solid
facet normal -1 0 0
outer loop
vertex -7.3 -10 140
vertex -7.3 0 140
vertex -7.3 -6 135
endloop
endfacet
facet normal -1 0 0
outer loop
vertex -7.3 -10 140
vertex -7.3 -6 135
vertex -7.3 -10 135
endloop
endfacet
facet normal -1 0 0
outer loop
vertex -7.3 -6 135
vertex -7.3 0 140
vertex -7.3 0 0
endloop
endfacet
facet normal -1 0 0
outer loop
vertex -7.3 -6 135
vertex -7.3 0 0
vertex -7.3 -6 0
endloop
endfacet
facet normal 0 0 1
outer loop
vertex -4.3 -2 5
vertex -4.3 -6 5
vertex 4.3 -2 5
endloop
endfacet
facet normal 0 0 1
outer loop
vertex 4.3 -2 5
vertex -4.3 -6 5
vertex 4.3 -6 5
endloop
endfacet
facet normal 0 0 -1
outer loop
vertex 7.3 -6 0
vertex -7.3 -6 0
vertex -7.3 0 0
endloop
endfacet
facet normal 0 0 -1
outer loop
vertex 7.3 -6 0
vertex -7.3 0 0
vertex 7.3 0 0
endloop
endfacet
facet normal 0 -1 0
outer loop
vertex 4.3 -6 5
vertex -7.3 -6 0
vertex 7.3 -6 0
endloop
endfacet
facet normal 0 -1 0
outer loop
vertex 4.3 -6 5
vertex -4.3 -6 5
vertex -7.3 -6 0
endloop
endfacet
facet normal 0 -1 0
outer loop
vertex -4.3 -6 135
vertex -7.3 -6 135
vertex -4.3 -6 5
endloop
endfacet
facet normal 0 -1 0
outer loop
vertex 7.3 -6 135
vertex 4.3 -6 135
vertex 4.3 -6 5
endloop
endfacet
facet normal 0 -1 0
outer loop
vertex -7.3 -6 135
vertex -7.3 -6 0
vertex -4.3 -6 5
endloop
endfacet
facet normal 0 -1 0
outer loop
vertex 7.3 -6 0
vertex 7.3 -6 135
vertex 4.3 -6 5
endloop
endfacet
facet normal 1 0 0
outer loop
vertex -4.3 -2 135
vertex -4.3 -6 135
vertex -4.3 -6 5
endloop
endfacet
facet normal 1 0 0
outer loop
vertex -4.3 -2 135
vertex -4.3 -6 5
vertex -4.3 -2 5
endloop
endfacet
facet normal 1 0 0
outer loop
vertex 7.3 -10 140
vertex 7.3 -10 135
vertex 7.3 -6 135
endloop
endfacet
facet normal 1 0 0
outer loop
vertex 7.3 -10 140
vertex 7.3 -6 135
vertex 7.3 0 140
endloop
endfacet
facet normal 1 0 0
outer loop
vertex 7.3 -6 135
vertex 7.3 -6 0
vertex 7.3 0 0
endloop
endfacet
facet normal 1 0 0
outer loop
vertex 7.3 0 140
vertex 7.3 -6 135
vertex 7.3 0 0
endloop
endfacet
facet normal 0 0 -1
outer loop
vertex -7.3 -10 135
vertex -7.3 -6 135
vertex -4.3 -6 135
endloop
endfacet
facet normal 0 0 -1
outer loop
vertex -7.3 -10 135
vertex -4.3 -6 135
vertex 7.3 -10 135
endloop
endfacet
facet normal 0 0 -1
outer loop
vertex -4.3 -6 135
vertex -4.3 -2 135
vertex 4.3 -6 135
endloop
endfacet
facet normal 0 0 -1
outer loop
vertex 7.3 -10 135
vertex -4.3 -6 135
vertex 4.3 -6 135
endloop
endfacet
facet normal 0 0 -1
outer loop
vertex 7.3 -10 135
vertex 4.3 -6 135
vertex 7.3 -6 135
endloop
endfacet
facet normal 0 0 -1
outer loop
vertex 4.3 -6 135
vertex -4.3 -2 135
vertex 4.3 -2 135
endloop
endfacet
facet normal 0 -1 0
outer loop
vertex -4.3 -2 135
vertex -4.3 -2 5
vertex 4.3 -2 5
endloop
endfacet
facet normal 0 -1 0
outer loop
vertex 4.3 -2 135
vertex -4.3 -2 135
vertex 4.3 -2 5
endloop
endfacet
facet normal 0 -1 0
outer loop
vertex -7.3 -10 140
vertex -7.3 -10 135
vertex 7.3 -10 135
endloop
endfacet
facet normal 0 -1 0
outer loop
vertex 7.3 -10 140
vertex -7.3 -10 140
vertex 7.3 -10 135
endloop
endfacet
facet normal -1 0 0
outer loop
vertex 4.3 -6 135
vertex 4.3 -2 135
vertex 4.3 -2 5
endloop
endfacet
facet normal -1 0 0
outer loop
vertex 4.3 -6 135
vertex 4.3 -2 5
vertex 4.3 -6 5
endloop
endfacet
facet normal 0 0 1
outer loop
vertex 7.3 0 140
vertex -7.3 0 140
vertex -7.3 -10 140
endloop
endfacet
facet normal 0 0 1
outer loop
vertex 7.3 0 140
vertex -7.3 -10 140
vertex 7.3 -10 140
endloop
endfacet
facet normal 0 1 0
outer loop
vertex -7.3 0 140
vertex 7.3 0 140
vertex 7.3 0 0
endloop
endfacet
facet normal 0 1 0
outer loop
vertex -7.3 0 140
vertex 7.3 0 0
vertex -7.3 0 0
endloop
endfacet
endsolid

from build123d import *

# Parameters (mm, degrees)
BOSS_EXTRU_4_DEPTH = 140
BOSS_EXTRU_5_REACH = 142.319
ESQUISSE2_W        = 14.6
ESQUISSE2_H        = 5
ESQUISSE4_W        = 14.6
ESQUISSE4_H        = 5
BOSS_EXTRU_6_DEPTH = 10


with BuildPart() as part:
    # Esquisse1 → Boss.-Extru.4 (new body)
    with BuildSketch(Plane.XY):
        Polygon((-7.3, 0), (-7.3, -6), (-4.3, -6), (-4.3, -2), (4.3, -2), (4.3, -6), (7.3, -6), (7.3, 0), align=None)
    extrude(amount=BOSS_EXTRU_4_DEPTH)

    # Esquisse2 → Boss.-Extru.5 (add, up to next)
    with BuildSketch(Plane.XZ.offset(6), mode=Mode.PRIVATE) as boss_extru_5_sk1:
        with Locations((0, 2.5)):
            Rectangle(ESQUISSE2_W, ESQUISSE2_H)
    boss_extru_5_tool1 = extrude(boss_extru_5_sk1.sketch, amount=-BOSS_EXTRU_5_REACH, mode=Mode.PRIVATE) - part.part
    add(boss_extru_5_tool1.solids().sort_by_distance((0, -6, 2.5))[0])

    # Esquisse4 → Boss.-Extru.6 (add)
    with BuildSketch(Plane(origin=(0, 0, 0), x_dir=(1, 0, 0), z_dir=(0, 1, 0))):
        with Locations((0, -137.5)):
            Rectangle(ESQUISSE4_W, ESQUISSE4_H)
    extrude(amount=-BOSS_EXTRU_6_DEPTH)


solid = part.part
